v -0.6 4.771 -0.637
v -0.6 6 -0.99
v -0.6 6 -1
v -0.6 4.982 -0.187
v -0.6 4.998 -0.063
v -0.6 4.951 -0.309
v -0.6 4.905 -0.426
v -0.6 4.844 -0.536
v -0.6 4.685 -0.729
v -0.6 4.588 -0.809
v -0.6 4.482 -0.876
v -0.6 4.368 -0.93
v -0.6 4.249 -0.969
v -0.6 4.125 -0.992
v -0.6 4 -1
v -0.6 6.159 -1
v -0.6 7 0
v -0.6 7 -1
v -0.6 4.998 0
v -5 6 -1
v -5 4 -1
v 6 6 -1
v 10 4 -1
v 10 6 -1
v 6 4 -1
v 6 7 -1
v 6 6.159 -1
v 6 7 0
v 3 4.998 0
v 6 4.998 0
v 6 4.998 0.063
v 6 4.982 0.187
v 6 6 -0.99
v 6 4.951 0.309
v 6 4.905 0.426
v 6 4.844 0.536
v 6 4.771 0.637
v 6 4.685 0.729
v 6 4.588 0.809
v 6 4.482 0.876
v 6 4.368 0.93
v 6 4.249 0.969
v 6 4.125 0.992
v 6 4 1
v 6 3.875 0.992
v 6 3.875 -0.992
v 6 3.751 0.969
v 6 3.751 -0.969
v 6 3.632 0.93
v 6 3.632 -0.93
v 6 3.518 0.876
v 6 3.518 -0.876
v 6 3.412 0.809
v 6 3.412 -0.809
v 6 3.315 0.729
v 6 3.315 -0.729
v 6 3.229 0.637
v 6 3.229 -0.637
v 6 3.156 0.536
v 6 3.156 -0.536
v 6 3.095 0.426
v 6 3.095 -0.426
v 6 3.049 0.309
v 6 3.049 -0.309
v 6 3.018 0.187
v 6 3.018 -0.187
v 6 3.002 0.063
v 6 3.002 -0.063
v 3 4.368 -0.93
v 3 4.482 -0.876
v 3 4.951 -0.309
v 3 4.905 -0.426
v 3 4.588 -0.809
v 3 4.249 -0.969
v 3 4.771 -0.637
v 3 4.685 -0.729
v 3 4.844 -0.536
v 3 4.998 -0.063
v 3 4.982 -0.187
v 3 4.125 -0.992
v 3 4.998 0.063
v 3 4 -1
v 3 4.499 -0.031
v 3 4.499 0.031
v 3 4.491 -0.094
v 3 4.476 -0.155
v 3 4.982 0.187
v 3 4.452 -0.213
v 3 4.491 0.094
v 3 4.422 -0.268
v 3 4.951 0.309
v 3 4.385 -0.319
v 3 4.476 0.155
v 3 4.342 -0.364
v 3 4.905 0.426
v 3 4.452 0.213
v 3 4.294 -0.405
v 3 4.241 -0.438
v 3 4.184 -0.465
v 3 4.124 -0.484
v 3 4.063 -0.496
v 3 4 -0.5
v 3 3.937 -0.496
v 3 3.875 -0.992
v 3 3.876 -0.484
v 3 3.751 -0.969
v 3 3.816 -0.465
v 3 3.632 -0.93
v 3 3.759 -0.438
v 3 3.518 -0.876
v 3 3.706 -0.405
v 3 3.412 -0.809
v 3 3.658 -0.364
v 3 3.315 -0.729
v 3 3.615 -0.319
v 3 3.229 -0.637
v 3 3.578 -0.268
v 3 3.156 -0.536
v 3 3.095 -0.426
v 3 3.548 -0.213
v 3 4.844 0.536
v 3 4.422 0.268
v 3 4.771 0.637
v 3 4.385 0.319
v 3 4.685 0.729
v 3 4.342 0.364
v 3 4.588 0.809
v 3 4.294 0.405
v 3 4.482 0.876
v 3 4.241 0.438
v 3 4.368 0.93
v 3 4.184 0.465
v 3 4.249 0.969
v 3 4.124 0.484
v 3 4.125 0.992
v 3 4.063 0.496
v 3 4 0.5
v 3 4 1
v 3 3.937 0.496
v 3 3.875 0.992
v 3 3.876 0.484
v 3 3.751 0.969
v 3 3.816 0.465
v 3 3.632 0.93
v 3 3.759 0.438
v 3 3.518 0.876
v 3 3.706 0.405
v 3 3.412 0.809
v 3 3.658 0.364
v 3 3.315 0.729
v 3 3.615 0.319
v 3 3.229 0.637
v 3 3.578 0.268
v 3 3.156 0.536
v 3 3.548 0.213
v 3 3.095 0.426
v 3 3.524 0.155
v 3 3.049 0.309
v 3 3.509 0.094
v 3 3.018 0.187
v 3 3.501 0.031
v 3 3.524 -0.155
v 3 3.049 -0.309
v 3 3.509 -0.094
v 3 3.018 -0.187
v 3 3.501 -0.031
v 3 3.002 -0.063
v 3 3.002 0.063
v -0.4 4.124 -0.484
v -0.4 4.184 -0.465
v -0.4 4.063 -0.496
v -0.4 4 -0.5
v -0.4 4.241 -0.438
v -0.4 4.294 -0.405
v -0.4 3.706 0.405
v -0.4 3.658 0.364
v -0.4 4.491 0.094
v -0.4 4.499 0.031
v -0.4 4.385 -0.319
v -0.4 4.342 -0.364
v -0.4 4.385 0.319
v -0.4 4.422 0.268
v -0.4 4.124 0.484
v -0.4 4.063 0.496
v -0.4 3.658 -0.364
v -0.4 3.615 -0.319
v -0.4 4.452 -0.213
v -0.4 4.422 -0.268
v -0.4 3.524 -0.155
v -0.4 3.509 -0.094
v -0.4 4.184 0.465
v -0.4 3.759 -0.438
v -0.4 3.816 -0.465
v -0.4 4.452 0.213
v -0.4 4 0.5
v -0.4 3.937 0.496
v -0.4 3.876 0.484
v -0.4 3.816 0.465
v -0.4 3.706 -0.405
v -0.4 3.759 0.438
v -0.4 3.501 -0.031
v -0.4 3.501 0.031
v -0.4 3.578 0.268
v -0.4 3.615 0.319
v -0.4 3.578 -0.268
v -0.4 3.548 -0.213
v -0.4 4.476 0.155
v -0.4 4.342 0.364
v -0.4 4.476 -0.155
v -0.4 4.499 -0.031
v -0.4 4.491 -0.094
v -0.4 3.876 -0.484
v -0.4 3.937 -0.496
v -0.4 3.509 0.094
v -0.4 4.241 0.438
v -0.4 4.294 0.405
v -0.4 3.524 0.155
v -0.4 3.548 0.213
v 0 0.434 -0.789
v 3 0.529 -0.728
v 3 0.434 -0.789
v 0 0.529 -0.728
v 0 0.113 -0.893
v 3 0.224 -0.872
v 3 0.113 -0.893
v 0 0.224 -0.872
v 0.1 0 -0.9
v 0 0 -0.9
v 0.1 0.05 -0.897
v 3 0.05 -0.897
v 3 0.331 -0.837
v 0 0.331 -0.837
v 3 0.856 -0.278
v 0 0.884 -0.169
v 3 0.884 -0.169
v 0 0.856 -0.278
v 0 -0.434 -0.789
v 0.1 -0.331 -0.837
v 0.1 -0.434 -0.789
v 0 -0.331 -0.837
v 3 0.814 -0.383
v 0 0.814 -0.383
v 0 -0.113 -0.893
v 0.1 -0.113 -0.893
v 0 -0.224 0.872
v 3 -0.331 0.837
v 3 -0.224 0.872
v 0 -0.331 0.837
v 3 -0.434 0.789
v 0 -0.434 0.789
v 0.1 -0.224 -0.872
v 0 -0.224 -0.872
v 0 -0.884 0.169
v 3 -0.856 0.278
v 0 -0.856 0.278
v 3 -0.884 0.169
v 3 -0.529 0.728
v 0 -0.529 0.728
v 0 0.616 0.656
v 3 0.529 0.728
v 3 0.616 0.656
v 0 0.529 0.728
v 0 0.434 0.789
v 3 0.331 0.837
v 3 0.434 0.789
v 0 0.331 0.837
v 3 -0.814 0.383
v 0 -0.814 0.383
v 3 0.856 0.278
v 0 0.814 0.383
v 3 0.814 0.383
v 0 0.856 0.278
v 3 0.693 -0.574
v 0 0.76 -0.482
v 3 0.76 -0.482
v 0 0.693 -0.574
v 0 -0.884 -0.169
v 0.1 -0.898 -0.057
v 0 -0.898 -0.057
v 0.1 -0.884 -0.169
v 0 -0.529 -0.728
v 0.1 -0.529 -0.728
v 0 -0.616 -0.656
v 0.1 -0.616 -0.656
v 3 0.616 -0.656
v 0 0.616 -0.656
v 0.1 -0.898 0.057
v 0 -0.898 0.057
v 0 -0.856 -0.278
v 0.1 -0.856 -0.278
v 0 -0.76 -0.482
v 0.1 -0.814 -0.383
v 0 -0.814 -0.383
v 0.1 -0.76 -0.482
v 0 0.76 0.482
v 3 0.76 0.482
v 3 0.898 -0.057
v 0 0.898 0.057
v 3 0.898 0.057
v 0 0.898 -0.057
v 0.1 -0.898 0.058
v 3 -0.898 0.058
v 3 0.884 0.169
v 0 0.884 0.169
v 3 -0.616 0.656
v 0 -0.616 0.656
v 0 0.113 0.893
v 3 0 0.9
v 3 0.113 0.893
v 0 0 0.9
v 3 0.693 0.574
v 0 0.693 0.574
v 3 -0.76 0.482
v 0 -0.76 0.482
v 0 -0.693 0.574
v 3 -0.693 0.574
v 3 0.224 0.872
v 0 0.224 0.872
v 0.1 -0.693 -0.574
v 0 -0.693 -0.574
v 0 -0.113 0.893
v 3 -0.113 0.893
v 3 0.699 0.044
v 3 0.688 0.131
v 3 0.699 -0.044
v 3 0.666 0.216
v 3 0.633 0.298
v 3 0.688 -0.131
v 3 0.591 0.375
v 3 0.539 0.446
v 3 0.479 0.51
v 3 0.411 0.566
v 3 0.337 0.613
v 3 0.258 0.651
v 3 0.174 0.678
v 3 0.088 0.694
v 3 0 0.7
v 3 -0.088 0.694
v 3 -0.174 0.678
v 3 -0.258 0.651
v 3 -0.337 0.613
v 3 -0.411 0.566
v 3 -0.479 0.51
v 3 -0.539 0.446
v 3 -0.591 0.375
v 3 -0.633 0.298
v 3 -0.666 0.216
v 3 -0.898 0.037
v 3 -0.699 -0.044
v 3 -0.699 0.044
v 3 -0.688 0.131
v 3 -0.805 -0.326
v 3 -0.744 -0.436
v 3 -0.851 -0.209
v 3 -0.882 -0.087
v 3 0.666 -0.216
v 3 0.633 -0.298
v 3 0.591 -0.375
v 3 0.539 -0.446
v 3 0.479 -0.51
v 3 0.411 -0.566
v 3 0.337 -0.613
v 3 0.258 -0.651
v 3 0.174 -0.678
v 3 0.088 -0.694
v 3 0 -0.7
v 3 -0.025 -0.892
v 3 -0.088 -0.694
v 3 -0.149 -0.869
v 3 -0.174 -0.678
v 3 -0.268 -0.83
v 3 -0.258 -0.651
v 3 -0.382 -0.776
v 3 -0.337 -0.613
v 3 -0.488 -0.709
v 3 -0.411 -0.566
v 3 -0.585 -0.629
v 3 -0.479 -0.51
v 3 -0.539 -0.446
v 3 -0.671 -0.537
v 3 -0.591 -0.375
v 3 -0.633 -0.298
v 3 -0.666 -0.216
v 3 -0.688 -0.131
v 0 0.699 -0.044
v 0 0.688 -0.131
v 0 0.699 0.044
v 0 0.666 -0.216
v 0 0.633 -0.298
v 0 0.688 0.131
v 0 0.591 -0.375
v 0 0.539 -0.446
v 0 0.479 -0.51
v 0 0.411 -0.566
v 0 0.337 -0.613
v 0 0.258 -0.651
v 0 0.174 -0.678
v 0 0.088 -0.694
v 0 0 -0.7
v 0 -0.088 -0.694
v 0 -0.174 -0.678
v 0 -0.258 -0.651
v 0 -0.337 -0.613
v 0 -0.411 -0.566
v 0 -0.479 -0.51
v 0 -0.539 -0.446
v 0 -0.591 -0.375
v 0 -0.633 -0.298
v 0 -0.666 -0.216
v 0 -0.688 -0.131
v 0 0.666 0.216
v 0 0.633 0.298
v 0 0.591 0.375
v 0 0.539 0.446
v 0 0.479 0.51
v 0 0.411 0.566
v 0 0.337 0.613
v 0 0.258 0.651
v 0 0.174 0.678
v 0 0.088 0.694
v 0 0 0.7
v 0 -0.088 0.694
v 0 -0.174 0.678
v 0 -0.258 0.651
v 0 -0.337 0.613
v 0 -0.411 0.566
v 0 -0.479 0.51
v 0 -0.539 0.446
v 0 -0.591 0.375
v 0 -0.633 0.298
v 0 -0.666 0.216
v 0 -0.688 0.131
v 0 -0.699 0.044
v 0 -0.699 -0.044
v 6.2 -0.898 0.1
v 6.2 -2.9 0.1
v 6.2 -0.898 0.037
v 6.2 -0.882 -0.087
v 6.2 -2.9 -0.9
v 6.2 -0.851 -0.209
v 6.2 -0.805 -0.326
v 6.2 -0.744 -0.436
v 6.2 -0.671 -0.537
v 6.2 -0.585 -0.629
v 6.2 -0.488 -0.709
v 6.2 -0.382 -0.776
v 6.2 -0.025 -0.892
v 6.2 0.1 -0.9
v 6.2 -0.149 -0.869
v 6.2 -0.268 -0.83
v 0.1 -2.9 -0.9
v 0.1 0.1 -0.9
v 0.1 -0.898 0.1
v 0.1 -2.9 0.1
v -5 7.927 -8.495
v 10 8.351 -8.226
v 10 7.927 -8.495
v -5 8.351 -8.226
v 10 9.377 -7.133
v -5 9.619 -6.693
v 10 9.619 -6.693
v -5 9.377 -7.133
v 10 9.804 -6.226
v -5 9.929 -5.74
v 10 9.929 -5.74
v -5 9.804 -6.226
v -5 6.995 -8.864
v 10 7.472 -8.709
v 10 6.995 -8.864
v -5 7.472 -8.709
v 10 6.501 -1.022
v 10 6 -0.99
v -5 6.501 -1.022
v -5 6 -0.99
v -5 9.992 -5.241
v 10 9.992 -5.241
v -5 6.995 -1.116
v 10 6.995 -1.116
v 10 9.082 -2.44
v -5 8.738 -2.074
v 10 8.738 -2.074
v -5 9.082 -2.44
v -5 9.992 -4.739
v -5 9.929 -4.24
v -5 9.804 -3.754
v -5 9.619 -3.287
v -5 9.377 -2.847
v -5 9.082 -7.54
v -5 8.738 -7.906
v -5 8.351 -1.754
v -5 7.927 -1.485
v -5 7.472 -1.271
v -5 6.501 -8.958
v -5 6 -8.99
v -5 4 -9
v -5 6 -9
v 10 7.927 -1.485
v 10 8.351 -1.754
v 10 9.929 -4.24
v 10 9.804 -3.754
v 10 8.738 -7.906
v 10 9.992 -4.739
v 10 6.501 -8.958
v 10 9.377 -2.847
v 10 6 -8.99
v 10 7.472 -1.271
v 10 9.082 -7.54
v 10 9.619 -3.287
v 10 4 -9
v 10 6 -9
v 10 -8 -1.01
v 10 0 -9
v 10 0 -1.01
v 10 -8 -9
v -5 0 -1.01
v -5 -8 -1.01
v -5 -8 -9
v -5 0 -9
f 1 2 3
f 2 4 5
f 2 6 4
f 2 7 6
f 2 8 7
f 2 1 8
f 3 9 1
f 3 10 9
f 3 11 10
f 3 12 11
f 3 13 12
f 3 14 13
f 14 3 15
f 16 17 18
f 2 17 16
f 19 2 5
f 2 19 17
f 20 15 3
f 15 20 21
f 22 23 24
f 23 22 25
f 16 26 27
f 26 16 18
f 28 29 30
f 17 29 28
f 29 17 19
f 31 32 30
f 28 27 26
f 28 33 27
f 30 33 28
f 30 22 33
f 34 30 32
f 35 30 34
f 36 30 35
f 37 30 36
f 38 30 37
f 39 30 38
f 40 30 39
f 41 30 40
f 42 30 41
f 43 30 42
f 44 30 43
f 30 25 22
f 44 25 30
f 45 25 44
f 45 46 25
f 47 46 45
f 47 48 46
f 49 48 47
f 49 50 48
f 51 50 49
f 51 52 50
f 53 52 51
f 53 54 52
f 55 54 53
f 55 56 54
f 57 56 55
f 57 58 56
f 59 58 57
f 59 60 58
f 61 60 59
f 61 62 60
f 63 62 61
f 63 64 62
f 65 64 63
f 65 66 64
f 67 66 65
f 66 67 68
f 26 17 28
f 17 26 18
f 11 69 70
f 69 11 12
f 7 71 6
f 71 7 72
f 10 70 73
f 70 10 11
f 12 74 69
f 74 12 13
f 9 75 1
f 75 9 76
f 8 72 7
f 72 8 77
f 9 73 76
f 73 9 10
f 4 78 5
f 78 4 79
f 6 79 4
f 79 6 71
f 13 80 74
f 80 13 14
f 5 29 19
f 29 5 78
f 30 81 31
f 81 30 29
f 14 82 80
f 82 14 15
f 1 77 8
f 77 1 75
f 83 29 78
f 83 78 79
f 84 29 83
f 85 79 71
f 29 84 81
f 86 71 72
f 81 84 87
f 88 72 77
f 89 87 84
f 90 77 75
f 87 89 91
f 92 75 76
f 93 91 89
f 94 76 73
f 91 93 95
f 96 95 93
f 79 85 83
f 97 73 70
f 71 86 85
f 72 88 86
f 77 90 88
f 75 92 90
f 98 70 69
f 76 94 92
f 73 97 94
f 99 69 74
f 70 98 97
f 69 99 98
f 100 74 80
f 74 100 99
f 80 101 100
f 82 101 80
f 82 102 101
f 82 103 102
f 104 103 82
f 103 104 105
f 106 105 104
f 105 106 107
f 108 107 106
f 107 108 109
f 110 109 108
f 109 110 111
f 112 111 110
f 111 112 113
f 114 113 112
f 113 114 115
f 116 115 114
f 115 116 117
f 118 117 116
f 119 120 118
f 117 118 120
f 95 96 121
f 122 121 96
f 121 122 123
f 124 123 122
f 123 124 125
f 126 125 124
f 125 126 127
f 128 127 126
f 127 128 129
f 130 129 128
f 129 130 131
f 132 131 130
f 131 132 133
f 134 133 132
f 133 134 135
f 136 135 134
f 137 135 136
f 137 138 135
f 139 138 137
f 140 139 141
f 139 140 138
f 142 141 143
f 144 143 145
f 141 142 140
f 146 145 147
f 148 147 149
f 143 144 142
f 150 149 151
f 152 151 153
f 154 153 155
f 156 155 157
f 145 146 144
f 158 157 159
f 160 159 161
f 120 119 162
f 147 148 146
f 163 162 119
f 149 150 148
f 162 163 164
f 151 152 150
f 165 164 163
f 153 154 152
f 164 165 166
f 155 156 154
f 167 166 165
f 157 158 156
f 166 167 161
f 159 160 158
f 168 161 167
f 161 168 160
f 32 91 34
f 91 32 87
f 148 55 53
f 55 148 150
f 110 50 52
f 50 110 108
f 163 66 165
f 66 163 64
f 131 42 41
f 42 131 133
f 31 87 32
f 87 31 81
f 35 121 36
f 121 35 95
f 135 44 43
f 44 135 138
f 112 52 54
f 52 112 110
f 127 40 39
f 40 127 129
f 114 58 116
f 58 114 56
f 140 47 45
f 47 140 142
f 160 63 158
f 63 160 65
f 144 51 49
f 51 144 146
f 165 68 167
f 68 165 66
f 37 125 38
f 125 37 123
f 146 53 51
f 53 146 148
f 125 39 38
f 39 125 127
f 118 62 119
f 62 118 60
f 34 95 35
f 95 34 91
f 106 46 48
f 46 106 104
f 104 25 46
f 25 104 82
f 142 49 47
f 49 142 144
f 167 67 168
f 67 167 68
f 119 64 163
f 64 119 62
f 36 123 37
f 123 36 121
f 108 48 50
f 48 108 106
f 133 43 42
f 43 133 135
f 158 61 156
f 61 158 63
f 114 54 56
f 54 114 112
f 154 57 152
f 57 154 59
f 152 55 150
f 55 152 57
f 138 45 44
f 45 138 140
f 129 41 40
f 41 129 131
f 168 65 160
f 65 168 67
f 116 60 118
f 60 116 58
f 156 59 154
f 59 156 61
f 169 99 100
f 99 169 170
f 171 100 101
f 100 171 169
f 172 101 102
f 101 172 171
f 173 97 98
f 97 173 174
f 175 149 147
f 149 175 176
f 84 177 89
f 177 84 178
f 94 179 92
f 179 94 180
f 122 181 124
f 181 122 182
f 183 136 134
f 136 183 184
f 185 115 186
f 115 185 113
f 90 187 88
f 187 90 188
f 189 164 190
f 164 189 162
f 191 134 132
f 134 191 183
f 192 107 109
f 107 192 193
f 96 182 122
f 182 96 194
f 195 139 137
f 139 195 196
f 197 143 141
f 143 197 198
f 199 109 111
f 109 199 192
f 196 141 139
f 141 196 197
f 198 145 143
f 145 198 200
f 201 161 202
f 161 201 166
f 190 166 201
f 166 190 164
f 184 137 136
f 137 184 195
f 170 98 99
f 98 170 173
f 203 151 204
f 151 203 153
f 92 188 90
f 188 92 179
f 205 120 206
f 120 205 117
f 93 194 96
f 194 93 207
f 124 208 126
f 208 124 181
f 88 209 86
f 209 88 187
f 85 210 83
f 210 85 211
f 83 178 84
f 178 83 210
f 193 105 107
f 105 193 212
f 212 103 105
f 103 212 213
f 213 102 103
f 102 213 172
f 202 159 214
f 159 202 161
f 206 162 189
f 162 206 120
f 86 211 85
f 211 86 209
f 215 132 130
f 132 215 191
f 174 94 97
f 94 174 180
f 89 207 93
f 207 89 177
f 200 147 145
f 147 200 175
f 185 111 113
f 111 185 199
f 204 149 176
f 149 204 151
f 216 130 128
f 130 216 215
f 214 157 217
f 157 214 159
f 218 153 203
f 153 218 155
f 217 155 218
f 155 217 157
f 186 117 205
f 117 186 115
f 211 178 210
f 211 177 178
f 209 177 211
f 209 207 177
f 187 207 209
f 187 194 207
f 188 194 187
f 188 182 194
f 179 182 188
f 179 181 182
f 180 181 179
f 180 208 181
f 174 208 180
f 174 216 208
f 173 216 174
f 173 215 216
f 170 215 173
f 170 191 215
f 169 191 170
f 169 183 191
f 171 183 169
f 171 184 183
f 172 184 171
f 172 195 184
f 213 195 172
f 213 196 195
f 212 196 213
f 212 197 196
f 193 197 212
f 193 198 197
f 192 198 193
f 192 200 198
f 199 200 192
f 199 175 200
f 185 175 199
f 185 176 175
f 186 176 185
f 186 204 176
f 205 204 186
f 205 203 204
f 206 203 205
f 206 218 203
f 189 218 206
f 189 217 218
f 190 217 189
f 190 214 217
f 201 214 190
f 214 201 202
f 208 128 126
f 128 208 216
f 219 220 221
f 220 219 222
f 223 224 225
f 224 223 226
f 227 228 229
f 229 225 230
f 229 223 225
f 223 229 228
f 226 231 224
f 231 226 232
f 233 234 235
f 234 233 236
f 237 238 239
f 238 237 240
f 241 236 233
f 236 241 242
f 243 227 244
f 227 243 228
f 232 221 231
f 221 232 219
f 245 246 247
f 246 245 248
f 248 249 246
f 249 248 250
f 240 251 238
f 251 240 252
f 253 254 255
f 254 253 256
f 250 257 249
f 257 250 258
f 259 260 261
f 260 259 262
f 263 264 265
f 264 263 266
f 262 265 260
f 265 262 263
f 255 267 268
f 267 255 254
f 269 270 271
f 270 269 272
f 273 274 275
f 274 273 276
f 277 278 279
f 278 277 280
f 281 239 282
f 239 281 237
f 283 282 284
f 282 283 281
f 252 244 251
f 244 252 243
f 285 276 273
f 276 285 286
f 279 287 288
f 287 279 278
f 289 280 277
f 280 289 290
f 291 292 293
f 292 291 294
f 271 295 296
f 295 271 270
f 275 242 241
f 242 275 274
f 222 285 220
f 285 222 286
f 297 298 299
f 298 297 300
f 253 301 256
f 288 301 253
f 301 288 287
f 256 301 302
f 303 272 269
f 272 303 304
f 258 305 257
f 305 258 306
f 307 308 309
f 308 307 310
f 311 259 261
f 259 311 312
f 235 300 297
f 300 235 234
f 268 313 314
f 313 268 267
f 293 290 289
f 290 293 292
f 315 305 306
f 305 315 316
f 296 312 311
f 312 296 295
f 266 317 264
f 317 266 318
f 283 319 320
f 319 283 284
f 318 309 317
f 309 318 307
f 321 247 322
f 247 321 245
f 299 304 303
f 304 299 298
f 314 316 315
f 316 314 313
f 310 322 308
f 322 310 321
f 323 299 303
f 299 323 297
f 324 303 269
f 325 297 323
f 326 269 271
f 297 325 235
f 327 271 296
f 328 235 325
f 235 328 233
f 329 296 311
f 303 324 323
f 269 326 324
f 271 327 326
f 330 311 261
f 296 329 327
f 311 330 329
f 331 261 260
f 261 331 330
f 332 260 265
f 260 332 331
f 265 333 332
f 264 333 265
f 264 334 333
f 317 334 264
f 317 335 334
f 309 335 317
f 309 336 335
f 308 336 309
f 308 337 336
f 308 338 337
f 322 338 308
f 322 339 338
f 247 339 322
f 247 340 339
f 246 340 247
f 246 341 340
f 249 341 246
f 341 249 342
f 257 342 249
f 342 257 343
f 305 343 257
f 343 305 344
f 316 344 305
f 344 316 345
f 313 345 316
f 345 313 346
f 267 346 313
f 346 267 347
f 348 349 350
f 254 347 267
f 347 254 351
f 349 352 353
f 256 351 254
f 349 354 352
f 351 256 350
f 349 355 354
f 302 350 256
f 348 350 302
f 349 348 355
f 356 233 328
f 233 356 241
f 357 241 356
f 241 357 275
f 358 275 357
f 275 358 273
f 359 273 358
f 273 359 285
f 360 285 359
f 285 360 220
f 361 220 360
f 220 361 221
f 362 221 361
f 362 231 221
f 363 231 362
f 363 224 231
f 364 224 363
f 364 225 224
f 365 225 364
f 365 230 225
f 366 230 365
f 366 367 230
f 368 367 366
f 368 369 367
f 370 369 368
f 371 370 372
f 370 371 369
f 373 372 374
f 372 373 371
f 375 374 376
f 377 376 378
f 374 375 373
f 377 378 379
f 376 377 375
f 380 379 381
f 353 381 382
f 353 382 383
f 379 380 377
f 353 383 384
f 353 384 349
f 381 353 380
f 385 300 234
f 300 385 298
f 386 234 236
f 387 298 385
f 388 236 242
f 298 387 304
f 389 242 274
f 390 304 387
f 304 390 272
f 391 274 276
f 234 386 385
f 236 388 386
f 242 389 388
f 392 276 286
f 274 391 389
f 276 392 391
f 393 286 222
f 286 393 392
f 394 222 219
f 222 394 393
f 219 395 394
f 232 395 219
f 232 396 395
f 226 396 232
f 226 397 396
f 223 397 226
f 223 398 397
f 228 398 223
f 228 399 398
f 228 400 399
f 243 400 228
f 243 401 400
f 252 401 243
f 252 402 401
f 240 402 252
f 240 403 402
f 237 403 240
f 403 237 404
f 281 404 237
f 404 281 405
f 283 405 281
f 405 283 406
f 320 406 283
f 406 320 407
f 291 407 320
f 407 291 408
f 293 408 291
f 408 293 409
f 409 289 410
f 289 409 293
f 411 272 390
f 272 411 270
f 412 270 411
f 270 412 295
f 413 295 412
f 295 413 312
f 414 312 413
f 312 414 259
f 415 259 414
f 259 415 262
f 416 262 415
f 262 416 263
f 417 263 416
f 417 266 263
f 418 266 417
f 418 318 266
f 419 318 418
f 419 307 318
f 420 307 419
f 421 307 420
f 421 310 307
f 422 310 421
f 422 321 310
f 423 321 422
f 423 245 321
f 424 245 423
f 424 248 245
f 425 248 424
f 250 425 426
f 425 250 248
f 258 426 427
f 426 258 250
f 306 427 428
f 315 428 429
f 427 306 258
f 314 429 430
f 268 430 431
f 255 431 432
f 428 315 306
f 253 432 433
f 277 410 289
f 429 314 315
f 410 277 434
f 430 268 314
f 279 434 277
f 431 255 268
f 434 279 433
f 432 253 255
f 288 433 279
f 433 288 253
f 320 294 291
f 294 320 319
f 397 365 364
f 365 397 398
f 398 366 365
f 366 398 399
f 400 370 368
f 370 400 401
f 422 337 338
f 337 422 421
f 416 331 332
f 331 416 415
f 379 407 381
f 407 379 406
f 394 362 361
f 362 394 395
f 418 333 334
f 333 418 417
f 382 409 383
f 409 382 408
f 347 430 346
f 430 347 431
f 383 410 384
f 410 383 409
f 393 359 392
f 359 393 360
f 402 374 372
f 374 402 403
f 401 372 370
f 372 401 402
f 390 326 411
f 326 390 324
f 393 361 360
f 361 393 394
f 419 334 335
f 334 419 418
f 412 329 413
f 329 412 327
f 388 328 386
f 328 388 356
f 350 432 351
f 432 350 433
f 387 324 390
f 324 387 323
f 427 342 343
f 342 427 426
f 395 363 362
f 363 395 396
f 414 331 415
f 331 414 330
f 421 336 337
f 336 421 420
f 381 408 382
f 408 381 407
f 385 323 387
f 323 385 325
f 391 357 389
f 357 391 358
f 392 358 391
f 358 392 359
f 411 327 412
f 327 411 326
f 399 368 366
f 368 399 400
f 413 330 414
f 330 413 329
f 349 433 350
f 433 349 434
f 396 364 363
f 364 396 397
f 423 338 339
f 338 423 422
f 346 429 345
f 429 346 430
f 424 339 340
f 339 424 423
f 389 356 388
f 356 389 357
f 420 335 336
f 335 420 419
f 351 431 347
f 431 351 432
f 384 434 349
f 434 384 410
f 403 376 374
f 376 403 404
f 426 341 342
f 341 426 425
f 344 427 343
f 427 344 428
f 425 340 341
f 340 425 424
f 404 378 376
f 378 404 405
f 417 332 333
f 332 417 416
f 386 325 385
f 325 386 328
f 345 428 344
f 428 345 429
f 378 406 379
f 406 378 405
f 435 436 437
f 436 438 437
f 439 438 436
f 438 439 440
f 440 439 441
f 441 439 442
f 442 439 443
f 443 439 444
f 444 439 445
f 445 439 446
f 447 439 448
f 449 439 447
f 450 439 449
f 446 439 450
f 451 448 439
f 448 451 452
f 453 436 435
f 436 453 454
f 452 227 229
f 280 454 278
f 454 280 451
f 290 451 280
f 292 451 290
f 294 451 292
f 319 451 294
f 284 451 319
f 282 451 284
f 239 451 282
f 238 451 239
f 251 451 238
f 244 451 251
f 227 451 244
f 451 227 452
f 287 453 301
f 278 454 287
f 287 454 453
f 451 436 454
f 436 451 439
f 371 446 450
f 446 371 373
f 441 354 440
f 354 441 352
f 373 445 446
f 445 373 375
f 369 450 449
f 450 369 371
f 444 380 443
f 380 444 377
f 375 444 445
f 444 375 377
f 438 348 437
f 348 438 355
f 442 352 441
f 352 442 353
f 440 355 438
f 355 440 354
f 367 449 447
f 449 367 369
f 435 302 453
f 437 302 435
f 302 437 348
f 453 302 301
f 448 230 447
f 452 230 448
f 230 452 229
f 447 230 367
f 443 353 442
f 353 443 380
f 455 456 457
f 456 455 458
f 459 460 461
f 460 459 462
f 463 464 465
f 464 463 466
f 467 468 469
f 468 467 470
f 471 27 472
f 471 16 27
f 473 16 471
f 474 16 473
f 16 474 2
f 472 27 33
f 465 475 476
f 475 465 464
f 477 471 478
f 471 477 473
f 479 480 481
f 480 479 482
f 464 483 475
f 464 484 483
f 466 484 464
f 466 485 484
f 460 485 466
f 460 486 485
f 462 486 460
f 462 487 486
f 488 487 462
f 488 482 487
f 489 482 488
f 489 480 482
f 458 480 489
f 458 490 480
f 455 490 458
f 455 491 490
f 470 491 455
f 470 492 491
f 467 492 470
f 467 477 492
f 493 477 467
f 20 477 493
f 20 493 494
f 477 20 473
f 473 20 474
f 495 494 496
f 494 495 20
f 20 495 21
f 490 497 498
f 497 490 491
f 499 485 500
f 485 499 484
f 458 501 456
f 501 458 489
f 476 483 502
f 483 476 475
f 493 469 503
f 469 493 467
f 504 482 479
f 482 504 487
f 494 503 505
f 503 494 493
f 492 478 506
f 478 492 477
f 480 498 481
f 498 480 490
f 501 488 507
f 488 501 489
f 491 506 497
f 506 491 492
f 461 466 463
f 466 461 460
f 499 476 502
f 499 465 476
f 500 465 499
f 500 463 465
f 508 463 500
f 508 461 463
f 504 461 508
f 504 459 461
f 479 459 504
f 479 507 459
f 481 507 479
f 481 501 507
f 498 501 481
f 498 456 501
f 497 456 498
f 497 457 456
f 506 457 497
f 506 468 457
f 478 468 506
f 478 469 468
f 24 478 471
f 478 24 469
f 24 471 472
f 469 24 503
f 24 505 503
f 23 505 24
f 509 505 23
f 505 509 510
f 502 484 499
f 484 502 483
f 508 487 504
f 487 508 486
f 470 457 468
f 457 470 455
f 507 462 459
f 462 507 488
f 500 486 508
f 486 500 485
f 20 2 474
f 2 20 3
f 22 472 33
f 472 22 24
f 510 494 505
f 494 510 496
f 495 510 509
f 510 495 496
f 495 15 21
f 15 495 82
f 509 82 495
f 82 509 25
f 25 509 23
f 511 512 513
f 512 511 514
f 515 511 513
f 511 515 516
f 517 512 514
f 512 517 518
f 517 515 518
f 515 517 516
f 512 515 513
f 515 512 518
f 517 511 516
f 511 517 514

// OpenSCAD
// file: hinge.scad
module block_long() { //long block
	difference(){
		cube([6.6, 3, 1]);
		
		translate([-1,0,0])
			rotate([0,270,180])
			cylinder(h=8, r=1, $fn=50);
	}
}

module block_short() { //long block
	difference(){
		cube([6.1,3,1]);
		
		translate([-1,0,0])
			rotate([0,270,180])
			cylinder(h=8, r=1, $fn=50);
	}
}

module cylinder_bottom(){
	difference(){
		cylinder(h=3, r=0.9, $fn=50);

		translate([0,0,-1])
			cylinder(h=8, r=0.7, $fn=50);
	}

	translate([-.1, .1, .1])
	rotate([0,270,180])
		block_short();
}

module cylinder_top(){

	translate([0,0,3])
		cylinder(h=3, r=1, $fn=50);
	translate([0,0,-.4]) //innder dowel
		cylinder(h=6.4, r=.5, $fn=50);

	translate([0, 0, 6])
		rotate([0,90,0])
			block_long();
//	translate([0,0,-.6])

//	cylinder(h=.2, r=1, $fn=50);
}

color("blue")
translate([0,-.2,-0.3])
	rotate([0,0, -50])
	cylinder_bottom();


cylinder_top();
// main file
use <hinge.scad>;
rotate([0,90,0]){
	color("blue")
	//rotate([0,0,30])
	translate([0,4,0])
	cylinder_top();
	
	cylinder_bottom();
}

module lead()
difference() { 
  cylinder(r=4, h=15, $fn=50); 
  translate([-5,0,-2]) 
	cube([10,5,20]); 
} 

//bottom box
translate([-5,-8,-9])
cube([15,8,7.99]);


//lead
color("red"){
	translate([-5,4,-9])
	//rotate([30,0,0])
	cube([15,2,8]);

	//half cylinder
	translate([10,6,-4.99])
	rotate([180,90,0])
	lead();
}
